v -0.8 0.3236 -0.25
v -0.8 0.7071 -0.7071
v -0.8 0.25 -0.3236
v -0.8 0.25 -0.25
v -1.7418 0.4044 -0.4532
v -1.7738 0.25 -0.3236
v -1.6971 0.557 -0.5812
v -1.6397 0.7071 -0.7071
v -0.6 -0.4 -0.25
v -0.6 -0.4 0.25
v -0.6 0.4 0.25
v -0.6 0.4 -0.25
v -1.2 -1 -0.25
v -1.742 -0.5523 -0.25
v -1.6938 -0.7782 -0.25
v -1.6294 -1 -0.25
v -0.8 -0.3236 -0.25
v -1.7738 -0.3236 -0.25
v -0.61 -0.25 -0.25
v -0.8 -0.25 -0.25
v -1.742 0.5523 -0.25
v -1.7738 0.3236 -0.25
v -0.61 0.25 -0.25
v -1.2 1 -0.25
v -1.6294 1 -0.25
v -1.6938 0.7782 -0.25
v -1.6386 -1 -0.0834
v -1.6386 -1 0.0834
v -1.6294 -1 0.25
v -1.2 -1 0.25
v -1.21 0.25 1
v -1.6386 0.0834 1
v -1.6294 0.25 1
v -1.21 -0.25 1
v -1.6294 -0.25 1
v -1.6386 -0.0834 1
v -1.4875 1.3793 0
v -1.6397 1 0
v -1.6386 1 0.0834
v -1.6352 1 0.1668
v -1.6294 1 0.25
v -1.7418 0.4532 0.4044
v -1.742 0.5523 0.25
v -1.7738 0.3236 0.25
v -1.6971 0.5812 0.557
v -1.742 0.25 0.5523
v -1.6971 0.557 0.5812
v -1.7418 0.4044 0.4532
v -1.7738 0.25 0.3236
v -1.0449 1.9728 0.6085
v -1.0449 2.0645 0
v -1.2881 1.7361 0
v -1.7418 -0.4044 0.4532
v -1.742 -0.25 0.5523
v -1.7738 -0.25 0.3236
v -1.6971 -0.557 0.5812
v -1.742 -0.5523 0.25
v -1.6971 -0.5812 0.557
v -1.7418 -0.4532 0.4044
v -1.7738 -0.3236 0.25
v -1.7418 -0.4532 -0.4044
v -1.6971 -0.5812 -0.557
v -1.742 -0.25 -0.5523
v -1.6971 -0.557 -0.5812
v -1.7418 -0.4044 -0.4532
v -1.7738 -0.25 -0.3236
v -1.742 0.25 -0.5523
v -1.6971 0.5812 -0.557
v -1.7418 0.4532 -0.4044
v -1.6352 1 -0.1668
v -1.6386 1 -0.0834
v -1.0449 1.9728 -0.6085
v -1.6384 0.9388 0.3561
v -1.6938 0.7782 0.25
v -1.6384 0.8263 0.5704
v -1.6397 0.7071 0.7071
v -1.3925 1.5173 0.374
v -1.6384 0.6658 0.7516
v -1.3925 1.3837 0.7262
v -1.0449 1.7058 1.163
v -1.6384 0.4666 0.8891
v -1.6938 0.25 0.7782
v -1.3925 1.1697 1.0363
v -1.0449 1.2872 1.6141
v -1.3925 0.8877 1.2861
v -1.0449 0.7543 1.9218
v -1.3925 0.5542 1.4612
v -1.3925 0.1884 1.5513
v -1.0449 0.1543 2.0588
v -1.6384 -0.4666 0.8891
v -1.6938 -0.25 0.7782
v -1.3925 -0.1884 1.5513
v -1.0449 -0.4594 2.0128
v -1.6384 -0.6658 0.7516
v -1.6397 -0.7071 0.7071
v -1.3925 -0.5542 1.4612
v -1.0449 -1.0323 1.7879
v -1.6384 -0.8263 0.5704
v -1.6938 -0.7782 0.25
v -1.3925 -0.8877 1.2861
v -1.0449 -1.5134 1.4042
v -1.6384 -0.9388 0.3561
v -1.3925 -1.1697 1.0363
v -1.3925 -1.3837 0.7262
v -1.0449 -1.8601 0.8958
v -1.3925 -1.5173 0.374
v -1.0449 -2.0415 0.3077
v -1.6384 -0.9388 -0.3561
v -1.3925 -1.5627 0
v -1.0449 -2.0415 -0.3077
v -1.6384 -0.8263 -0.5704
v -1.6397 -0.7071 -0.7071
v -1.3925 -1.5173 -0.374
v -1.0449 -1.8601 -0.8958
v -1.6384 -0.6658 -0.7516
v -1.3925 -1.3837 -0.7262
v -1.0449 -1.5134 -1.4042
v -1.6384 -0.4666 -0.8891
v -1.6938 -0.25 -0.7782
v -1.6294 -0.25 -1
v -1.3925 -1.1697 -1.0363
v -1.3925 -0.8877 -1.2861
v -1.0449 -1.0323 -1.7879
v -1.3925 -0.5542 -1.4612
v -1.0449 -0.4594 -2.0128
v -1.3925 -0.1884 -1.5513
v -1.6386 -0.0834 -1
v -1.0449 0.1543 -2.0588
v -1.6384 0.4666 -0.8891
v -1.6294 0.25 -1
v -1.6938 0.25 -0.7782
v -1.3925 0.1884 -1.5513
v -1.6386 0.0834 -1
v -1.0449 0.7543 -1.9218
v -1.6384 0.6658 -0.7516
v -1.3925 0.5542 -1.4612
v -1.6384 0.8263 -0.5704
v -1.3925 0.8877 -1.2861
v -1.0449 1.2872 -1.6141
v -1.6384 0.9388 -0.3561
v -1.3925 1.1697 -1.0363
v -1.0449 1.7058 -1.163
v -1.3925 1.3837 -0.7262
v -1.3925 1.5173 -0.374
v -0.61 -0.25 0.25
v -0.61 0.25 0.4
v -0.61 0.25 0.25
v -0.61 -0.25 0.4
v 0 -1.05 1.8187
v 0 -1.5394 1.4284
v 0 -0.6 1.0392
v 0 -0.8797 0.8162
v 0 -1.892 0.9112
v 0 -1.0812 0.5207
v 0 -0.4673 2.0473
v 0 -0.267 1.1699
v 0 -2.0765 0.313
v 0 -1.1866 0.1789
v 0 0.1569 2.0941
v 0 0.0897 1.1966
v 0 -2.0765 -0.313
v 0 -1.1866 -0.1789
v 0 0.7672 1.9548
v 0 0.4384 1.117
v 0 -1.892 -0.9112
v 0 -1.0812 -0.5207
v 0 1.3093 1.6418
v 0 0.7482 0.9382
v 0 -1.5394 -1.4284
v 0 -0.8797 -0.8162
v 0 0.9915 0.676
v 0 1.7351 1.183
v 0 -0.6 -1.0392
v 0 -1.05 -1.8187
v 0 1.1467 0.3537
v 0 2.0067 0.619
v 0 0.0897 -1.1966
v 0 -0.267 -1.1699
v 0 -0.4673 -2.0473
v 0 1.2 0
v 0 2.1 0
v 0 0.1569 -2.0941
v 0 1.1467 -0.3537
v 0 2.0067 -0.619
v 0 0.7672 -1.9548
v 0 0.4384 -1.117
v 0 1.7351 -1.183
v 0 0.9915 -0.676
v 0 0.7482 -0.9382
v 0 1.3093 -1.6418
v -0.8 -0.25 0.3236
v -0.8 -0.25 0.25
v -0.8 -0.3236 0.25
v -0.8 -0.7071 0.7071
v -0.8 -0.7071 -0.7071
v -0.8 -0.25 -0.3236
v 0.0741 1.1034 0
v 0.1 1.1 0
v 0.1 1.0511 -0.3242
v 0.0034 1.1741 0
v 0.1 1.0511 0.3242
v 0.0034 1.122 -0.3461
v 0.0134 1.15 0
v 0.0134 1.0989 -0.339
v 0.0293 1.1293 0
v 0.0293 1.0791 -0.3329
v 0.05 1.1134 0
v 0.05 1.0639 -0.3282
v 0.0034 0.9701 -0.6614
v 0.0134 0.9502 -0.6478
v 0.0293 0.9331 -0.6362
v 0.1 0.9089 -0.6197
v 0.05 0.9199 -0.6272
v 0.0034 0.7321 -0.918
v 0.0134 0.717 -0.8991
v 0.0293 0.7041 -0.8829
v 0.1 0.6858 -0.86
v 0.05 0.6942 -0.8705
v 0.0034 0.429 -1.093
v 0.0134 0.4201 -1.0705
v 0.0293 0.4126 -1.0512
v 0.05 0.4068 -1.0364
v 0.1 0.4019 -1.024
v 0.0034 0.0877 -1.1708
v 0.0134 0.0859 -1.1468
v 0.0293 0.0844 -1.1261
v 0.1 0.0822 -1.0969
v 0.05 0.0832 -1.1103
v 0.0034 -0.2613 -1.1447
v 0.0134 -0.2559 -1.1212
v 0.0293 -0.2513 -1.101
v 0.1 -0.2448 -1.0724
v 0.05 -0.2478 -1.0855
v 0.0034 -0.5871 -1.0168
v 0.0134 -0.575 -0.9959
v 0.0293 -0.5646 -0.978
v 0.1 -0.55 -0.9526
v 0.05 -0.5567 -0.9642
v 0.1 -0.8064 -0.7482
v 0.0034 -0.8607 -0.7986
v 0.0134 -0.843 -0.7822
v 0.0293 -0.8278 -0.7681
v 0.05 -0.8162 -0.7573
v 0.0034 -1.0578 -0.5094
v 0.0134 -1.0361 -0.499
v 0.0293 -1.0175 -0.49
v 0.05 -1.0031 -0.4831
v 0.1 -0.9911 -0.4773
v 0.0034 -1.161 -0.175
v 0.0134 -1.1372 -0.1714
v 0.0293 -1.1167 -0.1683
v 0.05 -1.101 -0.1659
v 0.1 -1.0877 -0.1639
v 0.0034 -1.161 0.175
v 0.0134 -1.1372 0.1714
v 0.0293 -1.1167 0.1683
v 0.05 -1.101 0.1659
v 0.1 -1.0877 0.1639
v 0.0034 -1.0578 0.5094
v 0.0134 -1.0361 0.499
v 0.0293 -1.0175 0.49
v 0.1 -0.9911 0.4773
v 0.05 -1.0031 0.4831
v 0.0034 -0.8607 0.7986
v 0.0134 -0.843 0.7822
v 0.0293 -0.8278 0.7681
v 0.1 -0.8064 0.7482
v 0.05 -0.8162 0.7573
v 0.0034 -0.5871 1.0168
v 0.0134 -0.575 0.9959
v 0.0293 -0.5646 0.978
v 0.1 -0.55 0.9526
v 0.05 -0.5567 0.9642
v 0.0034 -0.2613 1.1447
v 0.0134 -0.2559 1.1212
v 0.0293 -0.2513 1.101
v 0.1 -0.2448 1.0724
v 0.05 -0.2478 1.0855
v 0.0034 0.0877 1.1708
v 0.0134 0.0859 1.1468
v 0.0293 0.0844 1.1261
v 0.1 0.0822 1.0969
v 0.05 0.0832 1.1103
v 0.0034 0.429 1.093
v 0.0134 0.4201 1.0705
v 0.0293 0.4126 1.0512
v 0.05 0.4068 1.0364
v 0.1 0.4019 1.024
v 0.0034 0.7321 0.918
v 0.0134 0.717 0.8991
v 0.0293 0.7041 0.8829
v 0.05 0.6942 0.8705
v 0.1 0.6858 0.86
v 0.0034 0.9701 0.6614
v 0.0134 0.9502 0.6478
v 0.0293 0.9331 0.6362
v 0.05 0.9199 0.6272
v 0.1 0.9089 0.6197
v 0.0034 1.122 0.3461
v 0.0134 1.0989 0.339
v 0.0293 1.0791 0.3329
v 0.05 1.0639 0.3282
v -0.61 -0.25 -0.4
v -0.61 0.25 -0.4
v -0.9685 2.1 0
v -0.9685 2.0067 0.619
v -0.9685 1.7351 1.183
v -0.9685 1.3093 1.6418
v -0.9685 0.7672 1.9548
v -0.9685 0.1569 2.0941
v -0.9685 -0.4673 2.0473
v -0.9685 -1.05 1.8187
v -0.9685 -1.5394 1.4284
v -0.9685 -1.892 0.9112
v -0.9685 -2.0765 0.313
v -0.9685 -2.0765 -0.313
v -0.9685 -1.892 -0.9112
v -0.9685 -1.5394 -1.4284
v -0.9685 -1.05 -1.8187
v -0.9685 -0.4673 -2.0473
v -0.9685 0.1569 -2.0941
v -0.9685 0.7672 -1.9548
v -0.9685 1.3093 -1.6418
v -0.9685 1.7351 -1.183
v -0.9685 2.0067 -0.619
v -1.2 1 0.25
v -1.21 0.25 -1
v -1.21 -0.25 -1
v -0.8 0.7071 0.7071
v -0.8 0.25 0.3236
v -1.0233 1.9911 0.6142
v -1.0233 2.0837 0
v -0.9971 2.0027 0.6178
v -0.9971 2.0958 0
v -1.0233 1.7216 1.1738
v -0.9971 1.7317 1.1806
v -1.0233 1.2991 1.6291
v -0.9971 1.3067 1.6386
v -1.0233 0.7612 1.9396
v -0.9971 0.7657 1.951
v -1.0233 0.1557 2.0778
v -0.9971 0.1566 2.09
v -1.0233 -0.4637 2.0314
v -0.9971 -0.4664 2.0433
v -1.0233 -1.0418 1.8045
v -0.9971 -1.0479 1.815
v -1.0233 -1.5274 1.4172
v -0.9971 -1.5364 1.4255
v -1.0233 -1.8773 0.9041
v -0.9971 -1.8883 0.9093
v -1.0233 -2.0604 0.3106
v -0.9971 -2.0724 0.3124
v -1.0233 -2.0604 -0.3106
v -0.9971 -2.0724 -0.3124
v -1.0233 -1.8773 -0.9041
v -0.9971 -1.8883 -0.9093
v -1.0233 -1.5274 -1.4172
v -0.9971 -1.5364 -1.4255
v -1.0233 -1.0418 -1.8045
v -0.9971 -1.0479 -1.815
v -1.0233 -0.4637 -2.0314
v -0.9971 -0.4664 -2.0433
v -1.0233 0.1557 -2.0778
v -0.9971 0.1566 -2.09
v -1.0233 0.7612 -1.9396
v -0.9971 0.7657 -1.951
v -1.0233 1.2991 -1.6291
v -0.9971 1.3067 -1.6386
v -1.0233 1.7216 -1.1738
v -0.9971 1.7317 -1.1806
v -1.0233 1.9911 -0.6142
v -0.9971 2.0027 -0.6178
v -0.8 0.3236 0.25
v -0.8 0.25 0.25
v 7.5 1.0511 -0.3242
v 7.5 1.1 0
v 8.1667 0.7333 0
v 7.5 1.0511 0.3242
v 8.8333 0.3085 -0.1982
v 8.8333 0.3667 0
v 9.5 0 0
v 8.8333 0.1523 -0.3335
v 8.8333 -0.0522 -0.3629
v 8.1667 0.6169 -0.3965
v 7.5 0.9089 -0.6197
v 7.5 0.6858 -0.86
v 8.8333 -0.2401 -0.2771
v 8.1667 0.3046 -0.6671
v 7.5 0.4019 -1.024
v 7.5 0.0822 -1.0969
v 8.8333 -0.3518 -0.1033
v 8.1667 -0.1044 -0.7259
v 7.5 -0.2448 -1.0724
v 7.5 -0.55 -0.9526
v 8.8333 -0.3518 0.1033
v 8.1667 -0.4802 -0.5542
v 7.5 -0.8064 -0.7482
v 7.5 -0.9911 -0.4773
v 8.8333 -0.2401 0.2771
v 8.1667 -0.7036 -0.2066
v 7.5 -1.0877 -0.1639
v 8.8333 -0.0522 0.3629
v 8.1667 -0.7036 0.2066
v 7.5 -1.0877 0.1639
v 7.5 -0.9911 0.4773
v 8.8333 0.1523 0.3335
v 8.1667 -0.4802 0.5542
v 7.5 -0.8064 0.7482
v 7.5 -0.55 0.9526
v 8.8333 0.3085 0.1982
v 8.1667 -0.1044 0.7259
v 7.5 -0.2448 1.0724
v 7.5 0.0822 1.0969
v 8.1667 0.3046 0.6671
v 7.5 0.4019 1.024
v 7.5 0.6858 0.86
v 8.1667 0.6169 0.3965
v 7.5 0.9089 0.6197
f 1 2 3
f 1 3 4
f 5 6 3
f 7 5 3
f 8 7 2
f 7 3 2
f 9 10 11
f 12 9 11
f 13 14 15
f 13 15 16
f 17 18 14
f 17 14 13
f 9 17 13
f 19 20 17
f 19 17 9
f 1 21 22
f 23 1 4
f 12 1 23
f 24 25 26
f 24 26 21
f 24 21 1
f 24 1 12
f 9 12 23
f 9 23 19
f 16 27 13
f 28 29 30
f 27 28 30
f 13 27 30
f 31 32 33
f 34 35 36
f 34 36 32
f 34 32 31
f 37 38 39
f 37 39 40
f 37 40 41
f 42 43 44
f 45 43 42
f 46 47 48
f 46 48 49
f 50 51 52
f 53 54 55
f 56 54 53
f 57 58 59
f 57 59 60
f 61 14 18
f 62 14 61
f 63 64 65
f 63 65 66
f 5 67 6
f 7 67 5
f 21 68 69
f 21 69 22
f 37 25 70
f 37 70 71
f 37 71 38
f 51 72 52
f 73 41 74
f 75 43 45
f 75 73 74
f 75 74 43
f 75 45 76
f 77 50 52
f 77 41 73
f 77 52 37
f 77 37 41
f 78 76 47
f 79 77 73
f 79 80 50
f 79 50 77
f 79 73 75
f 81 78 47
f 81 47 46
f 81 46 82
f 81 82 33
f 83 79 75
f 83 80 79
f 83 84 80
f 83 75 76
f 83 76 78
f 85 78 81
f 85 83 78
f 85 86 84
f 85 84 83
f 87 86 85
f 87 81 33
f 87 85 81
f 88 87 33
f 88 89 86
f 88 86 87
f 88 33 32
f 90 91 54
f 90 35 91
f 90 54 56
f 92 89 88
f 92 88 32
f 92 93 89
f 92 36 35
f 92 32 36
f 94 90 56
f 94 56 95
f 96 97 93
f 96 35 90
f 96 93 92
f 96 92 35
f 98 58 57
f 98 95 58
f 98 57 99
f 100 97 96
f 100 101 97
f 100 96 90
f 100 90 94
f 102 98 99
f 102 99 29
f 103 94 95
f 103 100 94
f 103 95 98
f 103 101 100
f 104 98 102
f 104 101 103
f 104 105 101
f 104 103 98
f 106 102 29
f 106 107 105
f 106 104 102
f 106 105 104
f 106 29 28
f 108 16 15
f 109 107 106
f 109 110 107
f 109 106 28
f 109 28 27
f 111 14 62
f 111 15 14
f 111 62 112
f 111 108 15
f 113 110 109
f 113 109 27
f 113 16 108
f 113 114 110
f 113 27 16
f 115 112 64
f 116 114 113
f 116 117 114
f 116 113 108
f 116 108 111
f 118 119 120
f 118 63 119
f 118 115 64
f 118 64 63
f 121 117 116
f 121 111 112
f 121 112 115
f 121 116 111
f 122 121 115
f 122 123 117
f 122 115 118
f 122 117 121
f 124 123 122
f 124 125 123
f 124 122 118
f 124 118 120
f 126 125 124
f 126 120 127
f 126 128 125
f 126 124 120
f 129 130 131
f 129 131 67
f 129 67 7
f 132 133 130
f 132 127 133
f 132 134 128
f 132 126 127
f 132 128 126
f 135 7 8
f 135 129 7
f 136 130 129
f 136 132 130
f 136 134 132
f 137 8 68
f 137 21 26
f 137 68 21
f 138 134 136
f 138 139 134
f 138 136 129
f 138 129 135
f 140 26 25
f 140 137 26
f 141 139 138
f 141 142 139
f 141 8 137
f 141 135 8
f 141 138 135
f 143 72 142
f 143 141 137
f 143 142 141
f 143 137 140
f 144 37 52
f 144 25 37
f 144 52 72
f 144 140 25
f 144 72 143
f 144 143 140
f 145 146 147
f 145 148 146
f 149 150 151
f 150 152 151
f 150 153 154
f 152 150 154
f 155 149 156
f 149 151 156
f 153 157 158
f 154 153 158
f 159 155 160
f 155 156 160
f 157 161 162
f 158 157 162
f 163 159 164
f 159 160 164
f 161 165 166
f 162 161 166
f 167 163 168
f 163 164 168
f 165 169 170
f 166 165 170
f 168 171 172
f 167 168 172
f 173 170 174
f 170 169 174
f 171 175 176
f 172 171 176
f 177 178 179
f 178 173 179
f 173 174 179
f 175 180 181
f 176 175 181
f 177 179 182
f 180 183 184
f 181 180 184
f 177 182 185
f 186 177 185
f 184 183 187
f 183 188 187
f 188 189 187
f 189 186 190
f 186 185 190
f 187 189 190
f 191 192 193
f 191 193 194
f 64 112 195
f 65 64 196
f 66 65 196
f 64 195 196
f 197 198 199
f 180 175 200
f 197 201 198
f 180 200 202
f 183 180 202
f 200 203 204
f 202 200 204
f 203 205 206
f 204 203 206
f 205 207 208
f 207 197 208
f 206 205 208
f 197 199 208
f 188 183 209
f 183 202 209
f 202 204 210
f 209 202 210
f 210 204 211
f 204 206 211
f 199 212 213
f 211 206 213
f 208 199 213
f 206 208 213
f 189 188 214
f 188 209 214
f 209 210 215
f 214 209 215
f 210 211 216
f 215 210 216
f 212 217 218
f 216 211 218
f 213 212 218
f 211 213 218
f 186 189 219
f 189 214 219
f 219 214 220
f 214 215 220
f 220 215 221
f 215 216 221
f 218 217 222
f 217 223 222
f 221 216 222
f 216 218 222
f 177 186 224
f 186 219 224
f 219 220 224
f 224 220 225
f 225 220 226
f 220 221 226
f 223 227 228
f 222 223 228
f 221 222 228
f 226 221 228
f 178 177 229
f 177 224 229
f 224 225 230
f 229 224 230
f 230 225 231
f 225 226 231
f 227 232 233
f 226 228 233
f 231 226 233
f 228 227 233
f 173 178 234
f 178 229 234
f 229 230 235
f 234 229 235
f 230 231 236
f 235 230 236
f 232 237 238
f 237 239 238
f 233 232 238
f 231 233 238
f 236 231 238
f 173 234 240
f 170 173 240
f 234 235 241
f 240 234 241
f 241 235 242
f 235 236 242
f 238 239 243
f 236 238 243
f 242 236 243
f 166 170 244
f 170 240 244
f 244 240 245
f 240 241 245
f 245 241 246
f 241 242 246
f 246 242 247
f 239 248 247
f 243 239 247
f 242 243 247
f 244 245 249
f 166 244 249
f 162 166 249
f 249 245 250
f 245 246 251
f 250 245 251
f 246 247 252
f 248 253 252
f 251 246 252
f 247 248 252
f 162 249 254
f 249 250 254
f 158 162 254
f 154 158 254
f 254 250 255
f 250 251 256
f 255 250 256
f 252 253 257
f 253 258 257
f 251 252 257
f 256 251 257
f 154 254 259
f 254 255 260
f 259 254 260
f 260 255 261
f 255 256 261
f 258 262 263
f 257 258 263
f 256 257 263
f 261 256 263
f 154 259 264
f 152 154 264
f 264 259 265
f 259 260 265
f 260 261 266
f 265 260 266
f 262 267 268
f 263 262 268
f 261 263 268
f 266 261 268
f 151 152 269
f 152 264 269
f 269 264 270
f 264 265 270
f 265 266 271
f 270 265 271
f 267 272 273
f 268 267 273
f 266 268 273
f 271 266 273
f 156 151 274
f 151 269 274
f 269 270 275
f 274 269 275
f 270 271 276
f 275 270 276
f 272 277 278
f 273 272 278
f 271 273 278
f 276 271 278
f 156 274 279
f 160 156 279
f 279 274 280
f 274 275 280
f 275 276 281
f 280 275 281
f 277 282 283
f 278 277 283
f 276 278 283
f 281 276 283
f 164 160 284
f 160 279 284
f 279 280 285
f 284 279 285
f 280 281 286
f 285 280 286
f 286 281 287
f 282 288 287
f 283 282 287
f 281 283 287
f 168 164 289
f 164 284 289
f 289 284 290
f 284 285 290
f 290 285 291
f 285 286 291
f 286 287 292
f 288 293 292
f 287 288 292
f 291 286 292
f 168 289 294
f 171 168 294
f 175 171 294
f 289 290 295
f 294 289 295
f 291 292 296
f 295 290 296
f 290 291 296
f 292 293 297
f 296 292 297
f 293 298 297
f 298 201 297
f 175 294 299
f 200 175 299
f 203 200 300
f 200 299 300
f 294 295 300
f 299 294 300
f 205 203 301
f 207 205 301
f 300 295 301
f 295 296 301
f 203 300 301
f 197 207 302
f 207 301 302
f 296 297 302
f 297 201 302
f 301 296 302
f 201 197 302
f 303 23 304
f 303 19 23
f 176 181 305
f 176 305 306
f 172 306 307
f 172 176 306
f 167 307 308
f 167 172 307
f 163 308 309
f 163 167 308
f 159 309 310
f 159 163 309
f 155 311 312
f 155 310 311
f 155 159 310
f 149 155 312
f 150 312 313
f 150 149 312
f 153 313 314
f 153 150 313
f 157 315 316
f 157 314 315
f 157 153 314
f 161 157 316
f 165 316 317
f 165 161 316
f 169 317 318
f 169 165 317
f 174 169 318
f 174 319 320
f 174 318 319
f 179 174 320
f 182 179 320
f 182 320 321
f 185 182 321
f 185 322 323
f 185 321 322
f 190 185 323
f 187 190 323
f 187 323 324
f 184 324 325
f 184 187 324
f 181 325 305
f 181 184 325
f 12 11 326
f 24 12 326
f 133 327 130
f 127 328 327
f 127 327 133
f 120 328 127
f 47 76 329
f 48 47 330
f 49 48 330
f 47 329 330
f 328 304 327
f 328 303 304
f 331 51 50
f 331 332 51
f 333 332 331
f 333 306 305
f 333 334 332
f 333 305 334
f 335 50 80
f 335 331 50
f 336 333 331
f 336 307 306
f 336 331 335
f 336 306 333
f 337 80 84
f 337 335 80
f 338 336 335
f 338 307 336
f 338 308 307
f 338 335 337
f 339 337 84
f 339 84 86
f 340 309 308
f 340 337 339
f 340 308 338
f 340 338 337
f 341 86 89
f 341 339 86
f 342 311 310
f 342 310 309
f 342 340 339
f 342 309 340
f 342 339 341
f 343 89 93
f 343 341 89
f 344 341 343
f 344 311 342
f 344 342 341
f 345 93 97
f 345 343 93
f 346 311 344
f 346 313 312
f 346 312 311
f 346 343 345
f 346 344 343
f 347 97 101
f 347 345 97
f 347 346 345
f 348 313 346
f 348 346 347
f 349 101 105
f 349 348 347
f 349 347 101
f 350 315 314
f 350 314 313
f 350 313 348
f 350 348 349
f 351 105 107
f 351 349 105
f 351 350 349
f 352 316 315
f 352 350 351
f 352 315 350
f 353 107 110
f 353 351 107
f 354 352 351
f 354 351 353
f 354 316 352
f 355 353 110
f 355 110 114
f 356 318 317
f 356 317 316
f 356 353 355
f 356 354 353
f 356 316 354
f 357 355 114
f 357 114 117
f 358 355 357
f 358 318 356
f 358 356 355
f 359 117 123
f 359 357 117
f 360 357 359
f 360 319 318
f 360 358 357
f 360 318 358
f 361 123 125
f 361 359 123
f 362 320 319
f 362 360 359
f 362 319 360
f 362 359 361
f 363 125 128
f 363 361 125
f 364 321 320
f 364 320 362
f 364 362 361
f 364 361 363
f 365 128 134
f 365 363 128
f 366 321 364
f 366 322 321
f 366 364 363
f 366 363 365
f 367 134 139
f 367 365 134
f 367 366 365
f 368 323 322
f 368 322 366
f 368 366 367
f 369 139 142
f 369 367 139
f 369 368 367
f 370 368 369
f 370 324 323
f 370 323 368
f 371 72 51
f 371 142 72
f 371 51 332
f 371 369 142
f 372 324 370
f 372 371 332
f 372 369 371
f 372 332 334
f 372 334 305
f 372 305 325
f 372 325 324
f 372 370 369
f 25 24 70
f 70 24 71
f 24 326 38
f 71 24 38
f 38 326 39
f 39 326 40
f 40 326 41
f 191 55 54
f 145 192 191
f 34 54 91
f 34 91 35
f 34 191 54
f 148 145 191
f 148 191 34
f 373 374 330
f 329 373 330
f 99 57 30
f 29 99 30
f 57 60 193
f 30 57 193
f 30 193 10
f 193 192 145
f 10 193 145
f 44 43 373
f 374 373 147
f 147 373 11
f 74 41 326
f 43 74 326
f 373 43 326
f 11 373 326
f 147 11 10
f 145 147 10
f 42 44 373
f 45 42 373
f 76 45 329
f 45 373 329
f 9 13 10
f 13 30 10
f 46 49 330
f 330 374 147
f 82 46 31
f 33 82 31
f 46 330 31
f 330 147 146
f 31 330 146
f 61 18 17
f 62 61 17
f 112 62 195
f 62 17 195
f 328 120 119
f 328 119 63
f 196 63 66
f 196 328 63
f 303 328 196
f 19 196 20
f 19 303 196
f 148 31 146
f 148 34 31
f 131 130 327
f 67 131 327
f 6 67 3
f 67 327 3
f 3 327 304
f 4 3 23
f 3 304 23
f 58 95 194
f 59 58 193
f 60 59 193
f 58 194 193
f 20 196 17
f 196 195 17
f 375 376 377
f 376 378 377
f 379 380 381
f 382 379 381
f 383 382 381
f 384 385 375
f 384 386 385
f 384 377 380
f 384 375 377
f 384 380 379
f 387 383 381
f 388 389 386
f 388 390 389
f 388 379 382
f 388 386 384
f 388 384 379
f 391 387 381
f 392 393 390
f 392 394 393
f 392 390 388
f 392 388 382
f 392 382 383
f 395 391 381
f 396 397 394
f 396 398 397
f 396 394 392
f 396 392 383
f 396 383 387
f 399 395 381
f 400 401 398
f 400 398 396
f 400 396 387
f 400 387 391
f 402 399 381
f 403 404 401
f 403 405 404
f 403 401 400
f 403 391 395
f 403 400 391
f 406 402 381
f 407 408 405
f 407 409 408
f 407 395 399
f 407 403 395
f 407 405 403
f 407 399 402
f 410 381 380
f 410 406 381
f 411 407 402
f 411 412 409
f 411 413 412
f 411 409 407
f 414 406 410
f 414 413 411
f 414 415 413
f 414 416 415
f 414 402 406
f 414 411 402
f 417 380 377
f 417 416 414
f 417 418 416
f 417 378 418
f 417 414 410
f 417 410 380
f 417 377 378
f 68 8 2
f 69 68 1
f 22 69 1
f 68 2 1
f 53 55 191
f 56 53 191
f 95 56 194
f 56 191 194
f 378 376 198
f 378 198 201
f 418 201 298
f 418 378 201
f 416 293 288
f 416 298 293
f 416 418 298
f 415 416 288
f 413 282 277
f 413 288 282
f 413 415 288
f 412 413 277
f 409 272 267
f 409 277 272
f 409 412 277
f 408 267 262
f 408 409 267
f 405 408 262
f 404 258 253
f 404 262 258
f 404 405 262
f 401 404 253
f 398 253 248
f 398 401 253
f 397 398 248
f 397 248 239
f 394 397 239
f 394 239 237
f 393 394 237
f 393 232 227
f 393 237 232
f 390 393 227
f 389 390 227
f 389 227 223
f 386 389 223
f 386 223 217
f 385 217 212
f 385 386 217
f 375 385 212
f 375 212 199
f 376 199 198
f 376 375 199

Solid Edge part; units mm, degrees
sketch "Sketch1" plane through (0, 0, 0) normal (0, 0, 1) x (1, 0, 0)
  arc A0 (-1.8, 0) -> (-1.0449, 2.0645) centre (1.4, 0) cw
  arc A1 (-1.0449, 2.0645) -> (-0.9685, 2.1) centre (-0.9685, 2) cw
  line L0 (-0.9685, 2.1) -> (0, 2.1)
  line L1 (0, 2.1) -> (0, 1.2)
  arc A2 (0, 1.2) -> (0.1, 1.1) centre (0.1, 1.2) ccw
  line L2 (0.1, 1.1) -> (7.5, 1.1)
  line L3 (7.5, 1.1) -> (9.5, 0)
  line L4 (9.5, 0) -> (-1.8, 0)
revolve "RevolvedProtrusion1" add sketch "Sketch1" angle 360 about axis through (12.5, 0, 0) along (-1, 0, 0)
cosmetic_thread "Thread1" size "M2.2"
sketch "Sketch2" plane through (0, 0, 0) normal (0, 0, 1) x (1, 0, 0)
  line L0 (-1.8, -1) -> (-1.2, -1)
  line L1 (-1.2, -1) -> (-0.6, -0.4)
  line L2 (-0.6, -0.4) -> (-0.6, 0.4)
  line L3 (-0.6, 0.4) -> (-1.2, 1)
  line L4 (-1.2, 1) -> (-1.8, 1)
  line L5 (-1.8, 1) -> (-1.8, -1)
extrude "ExtrudedCutout_1" cut sketch "Sketch2" against normal blind 0.25 and the other way blind 0.25
sketch "Sketch3" plane through (0, 0, 0) normal (0, -1, 0) x (1, 0, 0)
  line L0 (-1.9, 1) -> (-1.21, 1)
  line L1 (-1.21, 1) -> (-0.61, 0.4)
  line L2 (-0.61, 0.4) -> (-0.61, -0.4)
  line L3 (-0.61, -0.4) -> (-1.21, -1)
  line L4 (-1.21, -1) -> (-1.9, -1)
  line L5 (-1.9, -1) -> (-1.9, 1)
extrude "ExtrudedCutout_2" cut sketch "Sketch3" against normal blind 0.25 and the other way blind 0.25
sketch "Sketch4" plane through (-0.8, 0, 0) normal (1, 0, 0) x (0, 1, 0)
  line L0 (-0.7071, 0.7071) -> (-0.1138, 0)
  line L1 (-0.1138, 0) -> (-0.7071, -0.7071)
  line L2 (-0.7071, -0.7071) -> (0, -0.1138)
  line L3 (0, -0.1138) -> (0.7071, -0.7071)
  line L4 (0.7071, -0.7071) -> (0.1138, 0)
  line L5 (0.1138, 0) -> (0.7071, 0.7071)
  line L6 (0.7071, 0.7071) -> (0, 0.1138)
  line L7 (0, 0.1138) -> (-0.7071, 0.7071)
extrude "ExtrudedCutout_3" cut sketch "Sketch4" against normal blind 1.8
properties part number "bene_inox_412405-2,2X9,5"
